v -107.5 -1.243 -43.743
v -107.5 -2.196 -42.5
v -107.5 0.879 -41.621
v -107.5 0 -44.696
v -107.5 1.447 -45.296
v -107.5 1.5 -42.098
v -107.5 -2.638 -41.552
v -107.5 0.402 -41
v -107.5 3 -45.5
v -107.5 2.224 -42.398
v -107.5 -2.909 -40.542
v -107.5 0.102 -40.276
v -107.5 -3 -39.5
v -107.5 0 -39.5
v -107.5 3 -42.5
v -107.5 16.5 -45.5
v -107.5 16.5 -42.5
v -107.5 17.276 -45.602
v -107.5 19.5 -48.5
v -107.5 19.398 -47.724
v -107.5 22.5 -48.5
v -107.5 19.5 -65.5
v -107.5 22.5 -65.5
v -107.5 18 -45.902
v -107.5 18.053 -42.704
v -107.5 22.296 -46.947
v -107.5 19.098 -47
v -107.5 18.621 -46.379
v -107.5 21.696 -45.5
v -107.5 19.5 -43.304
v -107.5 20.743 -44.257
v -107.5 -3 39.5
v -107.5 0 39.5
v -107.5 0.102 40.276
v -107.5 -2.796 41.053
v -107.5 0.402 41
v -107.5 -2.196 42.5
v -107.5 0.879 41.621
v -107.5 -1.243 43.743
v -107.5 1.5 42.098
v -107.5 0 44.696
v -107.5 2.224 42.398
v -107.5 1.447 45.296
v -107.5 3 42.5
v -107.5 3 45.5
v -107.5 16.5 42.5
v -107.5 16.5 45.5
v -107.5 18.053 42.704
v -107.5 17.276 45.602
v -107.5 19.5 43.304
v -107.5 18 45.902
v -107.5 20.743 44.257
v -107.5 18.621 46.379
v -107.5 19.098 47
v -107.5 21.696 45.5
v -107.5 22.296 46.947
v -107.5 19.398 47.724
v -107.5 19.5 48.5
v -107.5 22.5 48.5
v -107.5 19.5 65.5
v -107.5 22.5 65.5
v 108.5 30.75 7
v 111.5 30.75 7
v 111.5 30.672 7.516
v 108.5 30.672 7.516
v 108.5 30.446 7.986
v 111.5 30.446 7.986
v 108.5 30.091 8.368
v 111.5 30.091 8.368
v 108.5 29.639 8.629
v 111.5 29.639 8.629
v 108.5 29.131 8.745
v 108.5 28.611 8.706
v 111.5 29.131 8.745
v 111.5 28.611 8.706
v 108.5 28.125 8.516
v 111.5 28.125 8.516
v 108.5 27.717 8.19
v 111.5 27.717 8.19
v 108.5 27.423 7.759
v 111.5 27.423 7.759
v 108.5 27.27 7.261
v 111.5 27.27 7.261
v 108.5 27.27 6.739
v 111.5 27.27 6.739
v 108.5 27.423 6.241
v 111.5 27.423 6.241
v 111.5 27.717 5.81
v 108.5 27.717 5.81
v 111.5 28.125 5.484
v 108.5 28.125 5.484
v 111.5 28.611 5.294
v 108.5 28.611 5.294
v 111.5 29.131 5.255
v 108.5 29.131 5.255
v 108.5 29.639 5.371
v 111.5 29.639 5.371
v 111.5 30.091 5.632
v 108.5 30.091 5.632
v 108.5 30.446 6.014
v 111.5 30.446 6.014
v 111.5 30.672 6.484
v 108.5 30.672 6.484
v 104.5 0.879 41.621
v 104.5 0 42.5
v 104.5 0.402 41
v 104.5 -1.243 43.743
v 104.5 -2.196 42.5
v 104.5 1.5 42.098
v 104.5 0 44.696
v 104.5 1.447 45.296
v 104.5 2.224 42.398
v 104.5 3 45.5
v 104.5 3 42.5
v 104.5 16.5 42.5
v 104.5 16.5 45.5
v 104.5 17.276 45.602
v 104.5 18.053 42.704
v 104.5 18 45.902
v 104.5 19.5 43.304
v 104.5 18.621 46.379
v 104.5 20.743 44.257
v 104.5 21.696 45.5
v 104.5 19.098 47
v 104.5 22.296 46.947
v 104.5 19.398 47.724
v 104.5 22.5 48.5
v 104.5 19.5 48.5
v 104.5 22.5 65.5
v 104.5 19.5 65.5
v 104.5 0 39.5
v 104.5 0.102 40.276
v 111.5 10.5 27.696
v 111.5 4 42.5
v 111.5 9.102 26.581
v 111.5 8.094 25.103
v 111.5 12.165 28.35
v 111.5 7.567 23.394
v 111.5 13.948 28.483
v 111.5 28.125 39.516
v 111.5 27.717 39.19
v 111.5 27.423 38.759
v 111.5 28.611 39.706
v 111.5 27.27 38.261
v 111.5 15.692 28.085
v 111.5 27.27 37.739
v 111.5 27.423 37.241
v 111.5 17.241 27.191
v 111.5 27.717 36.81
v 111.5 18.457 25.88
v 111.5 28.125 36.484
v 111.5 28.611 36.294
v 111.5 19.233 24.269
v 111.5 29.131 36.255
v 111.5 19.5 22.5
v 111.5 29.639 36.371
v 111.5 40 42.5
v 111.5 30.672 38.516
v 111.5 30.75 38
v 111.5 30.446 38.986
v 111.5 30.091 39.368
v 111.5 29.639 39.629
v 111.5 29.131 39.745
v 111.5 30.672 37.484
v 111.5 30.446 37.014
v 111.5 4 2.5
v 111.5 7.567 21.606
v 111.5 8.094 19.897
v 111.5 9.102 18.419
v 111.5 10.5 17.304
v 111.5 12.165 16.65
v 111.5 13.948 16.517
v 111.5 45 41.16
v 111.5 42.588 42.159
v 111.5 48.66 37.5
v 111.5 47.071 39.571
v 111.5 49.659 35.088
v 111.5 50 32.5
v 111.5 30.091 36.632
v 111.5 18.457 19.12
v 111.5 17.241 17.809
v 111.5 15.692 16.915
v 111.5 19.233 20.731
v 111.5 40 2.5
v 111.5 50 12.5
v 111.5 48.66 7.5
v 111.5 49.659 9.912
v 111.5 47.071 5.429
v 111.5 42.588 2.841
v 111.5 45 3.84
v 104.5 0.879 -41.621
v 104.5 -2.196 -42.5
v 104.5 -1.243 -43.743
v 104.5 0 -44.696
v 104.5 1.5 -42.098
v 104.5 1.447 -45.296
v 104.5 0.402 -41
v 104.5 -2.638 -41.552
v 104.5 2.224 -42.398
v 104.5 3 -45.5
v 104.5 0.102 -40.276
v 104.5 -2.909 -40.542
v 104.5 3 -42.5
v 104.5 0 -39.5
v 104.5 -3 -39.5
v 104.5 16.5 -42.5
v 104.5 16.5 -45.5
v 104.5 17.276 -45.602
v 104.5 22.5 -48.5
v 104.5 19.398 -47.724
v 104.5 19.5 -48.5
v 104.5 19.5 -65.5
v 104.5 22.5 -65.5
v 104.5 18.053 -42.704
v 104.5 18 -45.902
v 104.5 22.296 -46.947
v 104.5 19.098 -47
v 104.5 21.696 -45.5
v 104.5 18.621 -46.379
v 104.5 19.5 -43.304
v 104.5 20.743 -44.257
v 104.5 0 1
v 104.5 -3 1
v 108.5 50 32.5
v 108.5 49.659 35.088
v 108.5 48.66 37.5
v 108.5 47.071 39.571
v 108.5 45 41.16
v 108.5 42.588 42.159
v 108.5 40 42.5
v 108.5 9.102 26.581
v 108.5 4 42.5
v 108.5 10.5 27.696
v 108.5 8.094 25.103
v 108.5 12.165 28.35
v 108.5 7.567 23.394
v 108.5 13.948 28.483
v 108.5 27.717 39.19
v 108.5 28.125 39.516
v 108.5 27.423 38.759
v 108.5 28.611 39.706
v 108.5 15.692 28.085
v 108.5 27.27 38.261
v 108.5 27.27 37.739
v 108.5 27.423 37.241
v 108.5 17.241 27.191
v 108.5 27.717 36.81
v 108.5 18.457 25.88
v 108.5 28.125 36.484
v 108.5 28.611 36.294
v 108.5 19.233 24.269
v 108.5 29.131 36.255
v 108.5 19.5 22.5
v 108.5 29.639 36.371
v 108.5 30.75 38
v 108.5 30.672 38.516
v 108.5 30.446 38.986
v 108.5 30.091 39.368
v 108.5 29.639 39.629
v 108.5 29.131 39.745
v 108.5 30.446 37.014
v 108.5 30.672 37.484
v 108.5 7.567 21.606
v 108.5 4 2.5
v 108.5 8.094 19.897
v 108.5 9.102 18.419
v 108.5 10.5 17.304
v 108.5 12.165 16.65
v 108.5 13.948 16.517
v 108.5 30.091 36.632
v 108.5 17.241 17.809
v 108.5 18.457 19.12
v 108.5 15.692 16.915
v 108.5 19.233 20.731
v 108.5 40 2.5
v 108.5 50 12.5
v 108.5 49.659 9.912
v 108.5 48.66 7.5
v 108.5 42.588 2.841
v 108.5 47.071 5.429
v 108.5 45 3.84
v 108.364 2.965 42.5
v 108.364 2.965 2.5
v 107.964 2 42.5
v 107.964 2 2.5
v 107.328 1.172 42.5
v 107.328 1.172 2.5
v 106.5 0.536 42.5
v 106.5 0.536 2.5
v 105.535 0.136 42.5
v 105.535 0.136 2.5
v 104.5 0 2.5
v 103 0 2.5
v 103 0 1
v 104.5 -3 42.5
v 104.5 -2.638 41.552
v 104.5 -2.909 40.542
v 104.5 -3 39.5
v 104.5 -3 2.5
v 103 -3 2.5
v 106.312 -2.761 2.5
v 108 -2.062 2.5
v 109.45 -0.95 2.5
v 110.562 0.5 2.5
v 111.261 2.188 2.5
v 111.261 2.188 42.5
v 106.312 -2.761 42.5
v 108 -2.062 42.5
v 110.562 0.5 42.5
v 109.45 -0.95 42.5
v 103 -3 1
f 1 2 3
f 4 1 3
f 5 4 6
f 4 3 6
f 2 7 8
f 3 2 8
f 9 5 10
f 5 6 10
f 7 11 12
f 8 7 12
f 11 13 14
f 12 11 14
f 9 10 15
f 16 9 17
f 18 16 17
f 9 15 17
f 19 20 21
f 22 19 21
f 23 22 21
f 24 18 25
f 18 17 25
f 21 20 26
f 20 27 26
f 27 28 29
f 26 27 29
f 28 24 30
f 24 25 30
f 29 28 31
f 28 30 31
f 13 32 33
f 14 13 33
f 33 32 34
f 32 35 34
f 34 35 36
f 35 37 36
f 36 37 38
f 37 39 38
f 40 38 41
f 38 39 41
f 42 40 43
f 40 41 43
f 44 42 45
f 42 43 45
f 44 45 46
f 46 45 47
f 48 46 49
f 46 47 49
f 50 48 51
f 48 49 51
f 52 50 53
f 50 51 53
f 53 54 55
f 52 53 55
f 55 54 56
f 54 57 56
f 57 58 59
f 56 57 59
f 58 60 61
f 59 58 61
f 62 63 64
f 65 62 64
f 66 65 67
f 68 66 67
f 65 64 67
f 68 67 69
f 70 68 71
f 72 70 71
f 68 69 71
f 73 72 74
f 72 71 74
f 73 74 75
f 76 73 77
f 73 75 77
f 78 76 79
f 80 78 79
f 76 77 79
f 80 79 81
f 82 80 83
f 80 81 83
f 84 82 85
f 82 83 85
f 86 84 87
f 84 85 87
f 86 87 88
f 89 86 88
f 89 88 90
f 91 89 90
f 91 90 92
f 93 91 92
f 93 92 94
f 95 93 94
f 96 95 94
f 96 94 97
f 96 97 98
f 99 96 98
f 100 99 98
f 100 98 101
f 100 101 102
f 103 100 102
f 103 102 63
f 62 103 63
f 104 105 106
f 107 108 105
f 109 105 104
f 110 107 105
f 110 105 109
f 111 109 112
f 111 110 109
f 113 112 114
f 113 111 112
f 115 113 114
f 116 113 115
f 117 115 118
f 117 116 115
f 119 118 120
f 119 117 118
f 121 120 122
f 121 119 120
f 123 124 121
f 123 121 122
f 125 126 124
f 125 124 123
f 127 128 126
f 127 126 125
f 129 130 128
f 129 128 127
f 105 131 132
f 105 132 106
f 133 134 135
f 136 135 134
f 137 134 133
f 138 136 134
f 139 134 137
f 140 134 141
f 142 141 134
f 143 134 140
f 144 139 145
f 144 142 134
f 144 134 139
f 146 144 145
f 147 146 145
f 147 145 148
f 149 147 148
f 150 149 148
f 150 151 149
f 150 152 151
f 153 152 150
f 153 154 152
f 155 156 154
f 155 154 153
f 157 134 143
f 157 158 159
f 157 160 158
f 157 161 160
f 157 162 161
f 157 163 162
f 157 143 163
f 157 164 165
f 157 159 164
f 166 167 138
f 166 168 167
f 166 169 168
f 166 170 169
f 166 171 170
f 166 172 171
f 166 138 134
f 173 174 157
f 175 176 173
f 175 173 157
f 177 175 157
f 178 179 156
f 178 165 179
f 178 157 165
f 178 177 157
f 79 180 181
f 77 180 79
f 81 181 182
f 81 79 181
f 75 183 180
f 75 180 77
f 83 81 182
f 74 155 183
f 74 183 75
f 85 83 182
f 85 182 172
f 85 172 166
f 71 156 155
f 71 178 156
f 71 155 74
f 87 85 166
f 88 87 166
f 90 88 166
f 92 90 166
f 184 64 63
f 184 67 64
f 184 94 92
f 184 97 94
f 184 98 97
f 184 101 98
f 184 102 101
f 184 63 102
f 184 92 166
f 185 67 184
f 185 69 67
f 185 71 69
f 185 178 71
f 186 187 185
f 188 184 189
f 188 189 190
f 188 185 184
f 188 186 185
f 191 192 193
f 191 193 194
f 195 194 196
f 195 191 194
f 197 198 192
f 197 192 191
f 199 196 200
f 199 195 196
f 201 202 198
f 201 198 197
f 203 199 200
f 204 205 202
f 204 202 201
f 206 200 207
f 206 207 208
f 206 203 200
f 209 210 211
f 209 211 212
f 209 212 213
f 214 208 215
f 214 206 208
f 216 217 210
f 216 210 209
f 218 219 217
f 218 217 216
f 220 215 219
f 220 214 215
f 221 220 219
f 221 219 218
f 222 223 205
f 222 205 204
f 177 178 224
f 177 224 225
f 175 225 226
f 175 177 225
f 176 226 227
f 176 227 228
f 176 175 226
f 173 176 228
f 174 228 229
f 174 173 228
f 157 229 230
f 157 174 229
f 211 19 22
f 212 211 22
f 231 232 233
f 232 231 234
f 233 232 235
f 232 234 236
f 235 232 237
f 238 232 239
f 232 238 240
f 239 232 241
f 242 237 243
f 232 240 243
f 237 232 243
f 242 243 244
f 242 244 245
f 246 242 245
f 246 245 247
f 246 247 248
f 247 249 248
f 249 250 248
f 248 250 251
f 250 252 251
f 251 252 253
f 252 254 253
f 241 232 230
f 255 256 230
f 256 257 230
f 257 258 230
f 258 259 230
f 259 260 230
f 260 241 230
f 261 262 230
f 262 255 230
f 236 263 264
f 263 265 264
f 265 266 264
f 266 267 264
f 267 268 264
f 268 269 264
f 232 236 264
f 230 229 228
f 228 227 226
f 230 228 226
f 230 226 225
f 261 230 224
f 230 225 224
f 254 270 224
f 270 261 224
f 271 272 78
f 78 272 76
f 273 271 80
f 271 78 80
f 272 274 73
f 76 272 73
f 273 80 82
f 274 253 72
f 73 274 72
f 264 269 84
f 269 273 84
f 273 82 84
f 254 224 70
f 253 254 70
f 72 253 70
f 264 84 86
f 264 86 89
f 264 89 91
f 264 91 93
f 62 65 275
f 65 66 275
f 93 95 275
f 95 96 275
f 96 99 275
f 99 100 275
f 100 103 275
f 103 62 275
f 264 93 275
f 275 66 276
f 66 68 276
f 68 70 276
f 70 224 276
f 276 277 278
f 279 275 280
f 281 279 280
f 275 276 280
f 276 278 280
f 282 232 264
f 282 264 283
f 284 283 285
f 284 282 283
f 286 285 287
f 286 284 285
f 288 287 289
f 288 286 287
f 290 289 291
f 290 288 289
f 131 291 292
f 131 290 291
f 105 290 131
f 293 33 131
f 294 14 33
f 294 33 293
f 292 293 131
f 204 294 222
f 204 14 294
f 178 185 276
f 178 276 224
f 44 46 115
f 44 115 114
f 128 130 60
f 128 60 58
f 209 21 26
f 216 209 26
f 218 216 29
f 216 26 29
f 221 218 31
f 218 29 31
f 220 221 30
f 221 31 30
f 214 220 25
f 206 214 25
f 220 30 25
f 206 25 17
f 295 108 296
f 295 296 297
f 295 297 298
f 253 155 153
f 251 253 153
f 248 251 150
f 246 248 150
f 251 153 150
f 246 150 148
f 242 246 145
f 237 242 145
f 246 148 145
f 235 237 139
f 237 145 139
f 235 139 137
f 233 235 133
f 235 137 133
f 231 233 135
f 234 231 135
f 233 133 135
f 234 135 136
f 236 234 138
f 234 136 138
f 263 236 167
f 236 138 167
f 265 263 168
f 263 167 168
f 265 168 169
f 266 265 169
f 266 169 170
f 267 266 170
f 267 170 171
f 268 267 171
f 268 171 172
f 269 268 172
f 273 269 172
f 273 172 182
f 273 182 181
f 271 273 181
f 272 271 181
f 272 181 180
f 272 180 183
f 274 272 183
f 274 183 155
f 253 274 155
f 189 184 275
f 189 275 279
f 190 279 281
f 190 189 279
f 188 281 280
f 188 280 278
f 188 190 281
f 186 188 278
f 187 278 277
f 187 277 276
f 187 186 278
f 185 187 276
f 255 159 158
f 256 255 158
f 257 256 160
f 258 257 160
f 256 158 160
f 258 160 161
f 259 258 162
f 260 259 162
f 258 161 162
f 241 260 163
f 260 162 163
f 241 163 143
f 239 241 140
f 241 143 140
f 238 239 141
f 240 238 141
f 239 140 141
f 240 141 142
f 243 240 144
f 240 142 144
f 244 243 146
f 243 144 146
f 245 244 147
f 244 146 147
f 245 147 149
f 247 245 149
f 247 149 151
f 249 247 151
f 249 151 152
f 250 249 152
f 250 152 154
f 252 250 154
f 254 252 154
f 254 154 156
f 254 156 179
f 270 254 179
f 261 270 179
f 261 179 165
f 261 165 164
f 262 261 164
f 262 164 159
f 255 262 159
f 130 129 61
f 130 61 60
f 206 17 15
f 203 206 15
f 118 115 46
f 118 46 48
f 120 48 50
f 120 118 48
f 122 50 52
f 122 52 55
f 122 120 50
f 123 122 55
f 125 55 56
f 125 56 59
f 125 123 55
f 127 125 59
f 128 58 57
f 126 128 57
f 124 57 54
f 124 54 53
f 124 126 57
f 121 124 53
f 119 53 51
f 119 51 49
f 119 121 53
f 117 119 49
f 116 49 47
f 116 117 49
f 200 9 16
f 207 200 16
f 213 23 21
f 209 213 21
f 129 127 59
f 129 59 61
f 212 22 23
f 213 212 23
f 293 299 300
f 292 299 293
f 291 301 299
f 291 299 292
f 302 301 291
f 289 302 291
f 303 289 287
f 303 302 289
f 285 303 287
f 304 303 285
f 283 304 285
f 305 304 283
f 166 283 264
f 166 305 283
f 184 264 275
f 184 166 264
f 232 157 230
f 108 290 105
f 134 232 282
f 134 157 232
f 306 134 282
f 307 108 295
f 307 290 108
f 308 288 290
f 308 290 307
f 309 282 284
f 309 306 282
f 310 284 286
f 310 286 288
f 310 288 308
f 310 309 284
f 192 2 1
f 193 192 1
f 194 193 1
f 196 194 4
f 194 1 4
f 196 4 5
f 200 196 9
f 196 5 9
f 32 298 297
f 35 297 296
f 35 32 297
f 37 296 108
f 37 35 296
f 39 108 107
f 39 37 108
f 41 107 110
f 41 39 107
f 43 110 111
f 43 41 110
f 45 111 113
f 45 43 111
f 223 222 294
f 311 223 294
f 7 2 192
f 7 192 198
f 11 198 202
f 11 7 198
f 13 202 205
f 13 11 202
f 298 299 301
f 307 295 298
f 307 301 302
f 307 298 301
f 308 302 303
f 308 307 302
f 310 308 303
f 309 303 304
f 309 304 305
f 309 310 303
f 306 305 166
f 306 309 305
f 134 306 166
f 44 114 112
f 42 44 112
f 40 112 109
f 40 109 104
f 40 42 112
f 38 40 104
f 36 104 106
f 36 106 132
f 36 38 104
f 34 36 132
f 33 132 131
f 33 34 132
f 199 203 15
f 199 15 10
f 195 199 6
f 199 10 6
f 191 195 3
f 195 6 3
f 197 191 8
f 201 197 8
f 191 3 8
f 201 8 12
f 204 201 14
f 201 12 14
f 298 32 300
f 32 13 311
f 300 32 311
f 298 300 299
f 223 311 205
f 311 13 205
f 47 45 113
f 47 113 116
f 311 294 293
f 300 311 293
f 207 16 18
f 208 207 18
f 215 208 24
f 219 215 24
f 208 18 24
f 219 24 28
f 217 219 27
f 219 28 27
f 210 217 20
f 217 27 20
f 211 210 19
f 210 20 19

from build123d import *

# Parameters (mm, degrees)
BASE_FLANGE1_DEPTH            = 3
EDGE_FLANGE1_STRIP_W          = 20
EDGE_FLANGE1_STRIP_H          = 3
EDGE_FLANGE1_STRIP_CUT_DEPTH  = 40
EDGE_FLANGE1_RELIEF_W         = 21.5
EDGE_FLANGE1_RELIEF_H         = 1.5
EDGE_FLANGE1_RELIEF_CUT_DEPTH = 3
EDGE_FLANGE1_DEPTH            = 40
SKETCH10_R                    = 1.75
SKETCH10_R_2                  = 6
CUT_EXTRUDE1_DEPTH            = 226.814636372
EDGE_FLANGE2_STRIP_W          = 18
EDGE_FLANGE2_STRIP_H          = 3
EDGE_FLANGE2_STRIP_CUT_DEPTH  = 212
EDGE_FLANGE2_DEPTH            = 212
EDGE_FLANGE3_STRIP_W          = 18
EDGE_FLANGE3_STRIP_H          = 3
EDGE_FLANGE3_STRIP_CUT_DEPTH  = 212
EDGE_FLANGE3_DEPTH            = 212
MIRROR1_START                 = -107.5
MIRROR1_DEPTH                 = 213.5
MIRROR1_START_2               = 104.5
MIRROR1_2_DEPTH               = 1.5
MIRROR1_3_DEPTH               = 212
TAB1_DEPTH                    = 3
CUT_EXTRUDE2_DEPTH            = 10


# Read off the part's stored shape, not the designer's step: Mirror1
# Sheet-metal steps are written as plain solids
with BuildPart() as part:
    # Sketch1 → Base-Flange1 (new body)
    with BuildSketch(Plane(origin=(0, 0, 0), x_dir=(1, 0, 0), z_dir=(0, 1, 0))):
        Polygon((-107.5, -42.5), (108.5, -42.5), (108.5, -2.5), (107.5, -2.5), (107.5, 42.5), (-107.5, 42.5), align=None)
    extrude(amount=-BASE_FLANGE1_DEPTH)

    # Edge-Flange1 strip (across the edge) → Edge-Flange1 strip cut (cut)
    with BuildSketch(Plane(origin=(108.5, 0, 42.5), x_dir=(-1, 0, 0), z_dir=(0, 0, -1))):
        with Locations((-6, -1.5)):
            Rectangle(EDGE_FLANGE1_STRIP_W, EDGE_FLANGE1_STRIP_H)
    extrude(amount=EDGE_FLANGE1_STRIP_CUT_DEPTH, mode=Mode.SUBTRACT)

    # Edge-Flange1 relief (on the sheet) → Edge-Flange1 relief cut (cut)
    with BuildSketch(Plane(origin=(104.5, 0, 42.5), x_dir=(-1, 0, 0), z_dir=(0, 1, 0))):
        with Locations((-9.25, -40.75)):
            Rectangle(EDGE_FLANGE1_RELIEF_W, EDGE_FLANGE1_RELIEF_H)
    extrude(amount=-EDGE_FLANGE1_RELIEF_CUT_DEPTH, mode=Mode.SUBTRACT)

    # Edge-Flange1 section (across the edge) → Edge-Flange1 (add)
    with BuildSketch(Plane(origin=(108.5, 0, 42.5), x_dir=(-1, 0, 0), z_dir=(0, 0, -1))):
        with BuildLine():
            Line((-3, 4), (-3, 35))
            Line((-3, 35), (0, 35))
            Line((0, 35), (0, 4))
            ThreePointArc((0, 4), (1.171572875, 1.171572875), (4, 0))
            Line((4, 0), (4, -3))
            ThreePointArc((4, -3), (-0.949747468, -0.949747468), (-3, 4))
        make_face()
    extrude(amount=EDGE_FLANGE1_DEPTH)

    # Sketch10 → Cut-Extrude1 (cut, through all)
    with BuildSketch(Plane(origin=(111.5, 0, 0), x_dir=(0, 0, -1), z_dir=(1, 0, 0))):
        with Locations(Location((-38, 29, 0), (0, 0, 90))):
            Circle(SKETCH10_R)
        with Locations(Location((-7, 29, 0), (0, 0, 90))):
            Circle(SKETCH10_R)
        with Locations(Location((-22.5, 13.5, 0), (0, 0, 90))):
            Circle(SKETCH10_R_2)
    extrude(amount=-CUT_EXTRUDE1_DEPTH, mode=Mode.SUBTRACT)

    # Edge-Flange2 strip (across the edge) → Edge-Flange2 strip cut (cut)
    with BuildSketch(Plane(origin=(-107.5, 0, 42.5), x_dir=(0, 0, -1), z_dir=(1, 0, 0))):
        with Locations((-6, -1.5)):
            Rectangle(EDGE_FLANGE2_STRIP_W, EDGE_FLANGE2_STRIP_H)
    extrude(amount=EDGE_FLANGE2_STRIP_CUT_DEPTH, mode=Mode.SUBTRACT)

    # Edge-Flange2 section (across the edge) → Edge-Flange2 (add)
    with BuildSketch(Plane(origin=(-107.5, 0, 42.5), x_dir=(0, 0, -1), z_dir=(1, 0, 0))):
        with BuildLine():
            Line((-3, 3), (-3, 19.5))
            Line((-3, 19.5), (0, 19.5))
            Line((0, 19.5), (0, 3))
            ThreePointArc((0, 3), (0.878679656, 0.878679656), (3, 0))
            Line((3, 0), (3, -3))
            ThreePointArc((3, -3), (-1.242640687, -1.242640687), (-3, 3))
        make_face()
    extrude(amount=EDGE_FLANGE2_DEPTH)

    # Edge-Flange3 strip (across the edge) → Edge-Flange3 strip cut (cut)
    with BuildSketch(Plane(origin=(104.5, 19.5, 45.5), x_dir=(0, -1, 0), z_dir=(-1, 0, 0))):
        with Locations((-6, -1.5)):
            Rectangle(EDGE_FLANGE3_STRIP_W, EDGE_FLANGE3_STRIP_H)
    extrude(amount=EDGE_FLANGE3_STRIP_CUT_DEPTH, mode=Mode.SUBTRACT)

    # Edge-Flange3 section (across the edge) → Edge-Flange3 (add)
    with BuildSketch(Plane(origin=(104.5, 19.5, 45.5), x_dir=(0, -1, 0), z_dir=(-1, 0, 0))):
        with BuildLine():
            Line((-3, 3), (-3, 20))
            Line((-3, 20), (0, 20))
            Line((0, 20), (0, 3))
            ThreePointArc((0, 3), (0.878679656, 0.878679656), (3, 0))
            Line((3, 0), (3, -3))
            ThreePointArc((3, -3), (-1.242640687, -1.242640687), (-3, 3))
        make_face()
    extrude(amount=EDGE_FLANGE3_DEPTH)

    # Mirror1 outline → Mirror1 (cut)
    with BuildSketch(Plane.YZ.offset(MIRROR1_START)):
        with BuildLine():
            Line((-3, -42.5), (-2.196152423, -42.5))
            ThreePointArc((-2.196152423, -42.5), (-2.795554958, -41.052914271), (-3, -39.5))
            Line((-3, -39.5), (-3, -42.5))
        make_face()
    extrude(amount=MIRROR1_DEPTH, mode=Mode.SUBTRACT)

    # Mirror1 2 outline → Mirror1 2 (cut)
    with BuildSketch(Plane.YZ.offset(MIRROR1_START_2)):
        with BuildLine():
            ThreePointArc((-3, -39.5), (-2.795554958, -41.052914271), (-2.196152423, -42.5))
            Line((-2.196152423, -42.5), (0, -42.5))
            Line((0, -42.5), (0, -38))
            Line((0, -38), (-3, -38))
            Line((-3, -38), (-3, -39.5))
        make_face()
    extrude(amount=MIRROR1_2_DEPTH, mode=Mode.SUBTRACT)

    # Mirror1 3 outline → Mirror1 3 (add)
    with BuildSketch(Plane.YZ.offset(MIRROR1_START)):
        with BuildLine():
            Line((3, -45.5), (16.5, -45.5))
            ThreePointArc((16.5, -45.5), (18.621320344, -46.378679656), (19.5, -48.5))
            Line((19.5, -48.5), (19.5, -65.5))
            Line((19.5, -65.5), (22.5, -65.5))
            Line((22.5, -65.5), (22.5, -48.5))
            ThreePointArc((22.5, -48.5), (20.742640687, -44.257359313), (16.5, -42.5))
            Line((16.5, -42.5), (3, -42.5))
            ThreePointArc((3, -42.5), (0.878679656, -41.621320344), (0, -39.5))
            Line((0, -39.5), (0, -42.5))
            Line((0, -42.5), (-2.196152423, -42.5))
            ThreePointArc((-2.196152423, -42.5), (0, -44.696152423), (3, -45.5))
        make_face()
    extrude(amount=MIRROR1_3_DEPTH)

    # Sketch18 → Tab1 (add)
    with BuildSketch(Plane(origin=(111.5, 0, 0), x_dir=(0, 0, -1), z_dir=(1, 0, 0))):
        with BuildLine():
            Line((-42.5, 35), (-2.5, 35))
            Line((-2.5, 35), (-2.5, 40))
            ThreePointArc((-2.5, 40), (-5.428932188, 47.071067812), (-12.5, 50))
            Line((-12.5, 50), (-32.5, 50))
            ThreePointArc((-32.5, 50), (-39.571067812, 47.071067812), (-42.5, 40))
            Line((-42.5, 40), (-42.5, 35))
        make_face()
    extrude(amount=-TAB1_DEPTH)

    # Sketch19 → Cut-Extrude2 (cut)
    with BuildSketch(Plane(origin=(0, 0, 0), x_dir=(1, 0, 0), z_dir=(0, 1, 0))):
        Polygon((107.5, -1), (107.5, 42.5), (106, 42.5), (104.5, 38), (104.5, -1), align=None)
    extrude(amount=-CUT_EXTRUDE2_DEPTH, mode=Mode.SUBTRACT)


solid = part.part
